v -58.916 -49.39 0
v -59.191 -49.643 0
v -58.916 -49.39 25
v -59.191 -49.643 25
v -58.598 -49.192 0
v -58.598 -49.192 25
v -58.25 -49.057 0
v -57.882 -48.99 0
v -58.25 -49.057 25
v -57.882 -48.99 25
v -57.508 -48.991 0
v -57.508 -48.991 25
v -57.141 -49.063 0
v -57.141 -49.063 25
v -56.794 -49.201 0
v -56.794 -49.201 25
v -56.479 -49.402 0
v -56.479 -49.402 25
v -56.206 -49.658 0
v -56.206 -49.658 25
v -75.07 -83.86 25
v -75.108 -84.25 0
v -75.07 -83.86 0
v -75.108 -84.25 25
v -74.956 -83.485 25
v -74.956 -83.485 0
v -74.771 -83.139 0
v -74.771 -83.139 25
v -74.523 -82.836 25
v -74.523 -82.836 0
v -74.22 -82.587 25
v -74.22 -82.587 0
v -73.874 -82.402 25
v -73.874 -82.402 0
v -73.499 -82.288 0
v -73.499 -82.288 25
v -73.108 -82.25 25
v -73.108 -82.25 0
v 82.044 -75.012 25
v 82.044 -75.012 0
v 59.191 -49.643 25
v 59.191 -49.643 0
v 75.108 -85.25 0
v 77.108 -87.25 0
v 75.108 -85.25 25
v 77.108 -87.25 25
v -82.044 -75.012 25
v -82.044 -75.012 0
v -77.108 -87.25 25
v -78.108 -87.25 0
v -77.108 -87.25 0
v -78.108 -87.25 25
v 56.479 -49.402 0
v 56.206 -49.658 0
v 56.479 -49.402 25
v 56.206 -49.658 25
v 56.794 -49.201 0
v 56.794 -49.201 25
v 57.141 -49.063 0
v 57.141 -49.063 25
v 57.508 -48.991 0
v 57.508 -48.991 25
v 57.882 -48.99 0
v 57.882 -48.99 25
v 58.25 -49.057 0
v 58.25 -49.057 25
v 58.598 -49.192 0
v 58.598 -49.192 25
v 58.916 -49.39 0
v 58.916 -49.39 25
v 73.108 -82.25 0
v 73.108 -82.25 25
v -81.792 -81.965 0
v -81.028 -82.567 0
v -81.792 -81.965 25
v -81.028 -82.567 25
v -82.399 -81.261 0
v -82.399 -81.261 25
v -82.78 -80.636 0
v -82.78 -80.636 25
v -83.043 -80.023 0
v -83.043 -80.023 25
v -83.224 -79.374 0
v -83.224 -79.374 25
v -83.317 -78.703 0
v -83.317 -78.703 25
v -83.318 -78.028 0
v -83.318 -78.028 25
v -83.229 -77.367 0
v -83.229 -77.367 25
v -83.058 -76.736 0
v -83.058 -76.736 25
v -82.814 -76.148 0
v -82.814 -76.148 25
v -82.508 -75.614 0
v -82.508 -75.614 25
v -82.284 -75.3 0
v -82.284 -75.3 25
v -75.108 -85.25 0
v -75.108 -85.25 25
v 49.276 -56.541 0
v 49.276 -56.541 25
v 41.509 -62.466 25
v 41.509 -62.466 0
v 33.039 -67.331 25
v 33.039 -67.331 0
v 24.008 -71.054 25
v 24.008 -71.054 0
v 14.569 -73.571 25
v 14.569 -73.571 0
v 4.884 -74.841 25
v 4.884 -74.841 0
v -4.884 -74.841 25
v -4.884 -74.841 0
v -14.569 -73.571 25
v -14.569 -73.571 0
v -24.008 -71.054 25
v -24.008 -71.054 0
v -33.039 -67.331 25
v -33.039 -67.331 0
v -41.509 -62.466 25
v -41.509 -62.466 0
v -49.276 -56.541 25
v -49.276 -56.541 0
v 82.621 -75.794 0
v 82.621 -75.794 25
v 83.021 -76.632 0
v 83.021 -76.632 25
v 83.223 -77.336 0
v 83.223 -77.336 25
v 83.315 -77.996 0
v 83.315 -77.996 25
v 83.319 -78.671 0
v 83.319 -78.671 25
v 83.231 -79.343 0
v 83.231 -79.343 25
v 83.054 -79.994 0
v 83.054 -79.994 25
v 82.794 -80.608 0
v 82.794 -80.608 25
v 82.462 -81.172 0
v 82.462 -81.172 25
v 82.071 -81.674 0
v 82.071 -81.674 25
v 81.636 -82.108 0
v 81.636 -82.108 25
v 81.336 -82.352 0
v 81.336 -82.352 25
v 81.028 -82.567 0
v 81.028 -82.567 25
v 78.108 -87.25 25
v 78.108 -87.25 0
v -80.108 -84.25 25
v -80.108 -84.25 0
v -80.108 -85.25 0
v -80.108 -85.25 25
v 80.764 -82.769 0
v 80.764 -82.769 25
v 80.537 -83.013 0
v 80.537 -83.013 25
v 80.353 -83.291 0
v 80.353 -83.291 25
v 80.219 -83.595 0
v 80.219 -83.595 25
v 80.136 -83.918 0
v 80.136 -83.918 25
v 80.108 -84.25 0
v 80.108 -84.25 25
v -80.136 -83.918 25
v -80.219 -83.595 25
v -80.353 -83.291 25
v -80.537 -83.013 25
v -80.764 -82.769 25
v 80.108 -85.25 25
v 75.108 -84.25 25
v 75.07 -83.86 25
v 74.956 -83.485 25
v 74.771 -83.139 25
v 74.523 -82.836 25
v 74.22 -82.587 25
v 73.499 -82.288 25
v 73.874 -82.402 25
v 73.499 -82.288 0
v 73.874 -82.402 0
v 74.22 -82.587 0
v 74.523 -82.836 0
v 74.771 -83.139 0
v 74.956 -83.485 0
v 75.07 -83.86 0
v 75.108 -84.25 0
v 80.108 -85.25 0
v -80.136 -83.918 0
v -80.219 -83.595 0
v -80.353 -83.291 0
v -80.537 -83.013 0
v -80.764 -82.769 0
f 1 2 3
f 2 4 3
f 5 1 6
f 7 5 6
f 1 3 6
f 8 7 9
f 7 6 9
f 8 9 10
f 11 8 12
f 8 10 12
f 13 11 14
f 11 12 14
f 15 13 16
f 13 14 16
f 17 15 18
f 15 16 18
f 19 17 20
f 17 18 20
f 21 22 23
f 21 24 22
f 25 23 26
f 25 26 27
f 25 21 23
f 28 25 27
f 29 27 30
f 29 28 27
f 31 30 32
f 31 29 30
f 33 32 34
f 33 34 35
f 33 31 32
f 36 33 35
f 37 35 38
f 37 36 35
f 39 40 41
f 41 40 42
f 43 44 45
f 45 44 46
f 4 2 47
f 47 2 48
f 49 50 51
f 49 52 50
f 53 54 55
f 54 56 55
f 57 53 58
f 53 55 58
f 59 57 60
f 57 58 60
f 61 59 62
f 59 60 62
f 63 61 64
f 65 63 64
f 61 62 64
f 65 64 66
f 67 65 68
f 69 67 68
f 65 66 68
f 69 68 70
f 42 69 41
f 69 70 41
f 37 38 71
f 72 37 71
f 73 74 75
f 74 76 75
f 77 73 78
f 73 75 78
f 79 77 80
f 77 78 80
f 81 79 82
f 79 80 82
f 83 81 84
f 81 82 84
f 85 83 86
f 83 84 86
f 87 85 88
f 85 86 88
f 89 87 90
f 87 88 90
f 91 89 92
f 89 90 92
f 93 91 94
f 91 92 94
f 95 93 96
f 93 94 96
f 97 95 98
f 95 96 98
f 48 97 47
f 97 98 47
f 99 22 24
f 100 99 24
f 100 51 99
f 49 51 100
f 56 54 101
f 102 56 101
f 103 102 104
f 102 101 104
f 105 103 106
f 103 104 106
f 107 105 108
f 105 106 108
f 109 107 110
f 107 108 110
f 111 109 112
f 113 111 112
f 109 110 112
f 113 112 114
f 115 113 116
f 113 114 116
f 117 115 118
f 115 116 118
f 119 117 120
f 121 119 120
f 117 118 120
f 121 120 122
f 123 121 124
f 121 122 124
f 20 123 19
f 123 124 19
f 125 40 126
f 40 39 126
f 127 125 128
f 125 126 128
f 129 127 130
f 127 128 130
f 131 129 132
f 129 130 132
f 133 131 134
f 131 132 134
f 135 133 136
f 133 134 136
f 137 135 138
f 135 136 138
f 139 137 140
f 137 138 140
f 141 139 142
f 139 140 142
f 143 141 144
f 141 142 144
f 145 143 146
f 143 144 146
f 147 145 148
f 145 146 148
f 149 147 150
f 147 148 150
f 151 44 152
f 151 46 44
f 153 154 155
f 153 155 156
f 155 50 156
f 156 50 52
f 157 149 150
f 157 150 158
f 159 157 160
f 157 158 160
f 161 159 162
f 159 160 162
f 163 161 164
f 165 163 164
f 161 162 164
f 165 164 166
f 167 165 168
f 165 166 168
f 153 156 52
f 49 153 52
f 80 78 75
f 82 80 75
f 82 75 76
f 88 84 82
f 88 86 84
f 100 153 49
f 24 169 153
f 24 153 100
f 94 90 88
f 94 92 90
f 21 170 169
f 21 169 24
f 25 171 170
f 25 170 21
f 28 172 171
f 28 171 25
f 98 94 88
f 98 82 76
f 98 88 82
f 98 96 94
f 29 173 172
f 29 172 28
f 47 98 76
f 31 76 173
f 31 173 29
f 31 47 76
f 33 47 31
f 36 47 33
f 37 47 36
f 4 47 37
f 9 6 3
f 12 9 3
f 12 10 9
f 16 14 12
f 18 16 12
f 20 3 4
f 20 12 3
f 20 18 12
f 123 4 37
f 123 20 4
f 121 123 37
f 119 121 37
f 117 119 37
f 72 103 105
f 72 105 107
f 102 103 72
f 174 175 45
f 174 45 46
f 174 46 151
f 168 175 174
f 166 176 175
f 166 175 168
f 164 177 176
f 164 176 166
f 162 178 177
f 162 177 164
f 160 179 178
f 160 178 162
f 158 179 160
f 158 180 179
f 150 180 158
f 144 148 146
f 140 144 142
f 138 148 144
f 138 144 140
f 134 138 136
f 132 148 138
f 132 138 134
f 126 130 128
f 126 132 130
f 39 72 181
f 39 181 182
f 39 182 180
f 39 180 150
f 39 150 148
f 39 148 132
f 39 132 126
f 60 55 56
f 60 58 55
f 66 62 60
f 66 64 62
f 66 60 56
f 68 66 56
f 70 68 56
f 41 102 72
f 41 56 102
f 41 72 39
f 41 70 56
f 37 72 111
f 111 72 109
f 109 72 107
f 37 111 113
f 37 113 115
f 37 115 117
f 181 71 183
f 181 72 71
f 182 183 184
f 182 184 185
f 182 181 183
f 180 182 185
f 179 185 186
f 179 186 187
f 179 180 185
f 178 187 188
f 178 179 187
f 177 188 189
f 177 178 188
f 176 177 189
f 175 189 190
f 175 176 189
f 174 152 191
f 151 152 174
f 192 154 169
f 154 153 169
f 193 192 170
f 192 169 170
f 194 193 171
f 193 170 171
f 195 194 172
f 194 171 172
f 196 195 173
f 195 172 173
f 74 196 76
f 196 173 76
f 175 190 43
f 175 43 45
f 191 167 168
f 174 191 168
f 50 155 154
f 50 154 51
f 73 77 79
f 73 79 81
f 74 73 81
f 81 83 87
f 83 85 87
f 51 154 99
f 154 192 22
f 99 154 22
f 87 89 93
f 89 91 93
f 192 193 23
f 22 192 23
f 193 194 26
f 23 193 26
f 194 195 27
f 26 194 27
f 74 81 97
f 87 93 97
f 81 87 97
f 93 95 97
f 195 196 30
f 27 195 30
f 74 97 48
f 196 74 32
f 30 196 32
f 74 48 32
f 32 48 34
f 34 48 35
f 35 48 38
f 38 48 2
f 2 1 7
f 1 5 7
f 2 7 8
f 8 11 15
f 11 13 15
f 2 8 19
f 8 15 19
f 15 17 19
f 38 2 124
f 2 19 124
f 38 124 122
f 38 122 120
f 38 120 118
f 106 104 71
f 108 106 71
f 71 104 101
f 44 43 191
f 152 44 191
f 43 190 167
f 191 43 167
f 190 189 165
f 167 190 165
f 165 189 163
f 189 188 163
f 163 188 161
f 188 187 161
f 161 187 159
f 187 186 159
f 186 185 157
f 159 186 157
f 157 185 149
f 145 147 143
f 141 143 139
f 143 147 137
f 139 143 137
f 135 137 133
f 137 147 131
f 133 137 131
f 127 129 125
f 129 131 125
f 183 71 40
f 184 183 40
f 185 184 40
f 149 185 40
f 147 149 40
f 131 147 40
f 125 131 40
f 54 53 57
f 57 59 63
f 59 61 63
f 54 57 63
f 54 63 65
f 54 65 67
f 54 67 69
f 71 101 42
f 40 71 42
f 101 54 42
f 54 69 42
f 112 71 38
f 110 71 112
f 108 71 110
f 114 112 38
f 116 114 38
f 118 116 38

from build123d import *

# Parameters (mm, degrees)
F1_DEPTH = 25
F2_W     = 5
F2_H     = 25
F3_DEPTH = 5
F4_SIZE  = 2
F5_R     = 2
F6_R     = 5


with BuildPart() as f1:
    # F0 (on Top) → F1 (new body)
    with BuildSketch(Plane.XY):
        with BuildLine():
            ThreePointArc((57.667806, -47.952312), (0, -75), (-57.667806, -47.952312))
            Line((-57.667806, -47.952312), (-88.564008, -82.249977))
            Line((-88.564008, -82.249977), (0, -82.249977))
            Line((0, -82.249977), (88.564008, -82.249977))
            Line((88.564008, -82.249977), (57.667806, -47.952312))
        make_face()
    extrude(amount=F1_DEPTH)

    # F2 (on face) → F3 (join)
    with BuildSketch(Plane.XZ.offset(82.249977)):
        with Locations((77.608379, 12.5)):
            Rectangle(F2_W, F2_H)
        with Locations((-77.608379, 12.5)):
            Rectangle(F2_W, F2_H)
    extrude(amount=F3_DEPTH)

    # F4
    f4_edges = [f1.edges().sort_by_distance(p)[0] for p in [
        (-80.108379, -87.249977, 12.5),
        (-75.108379, -87.249977, 12.5),
        (75.108379, -87.249977, 12.5),
        (80.108379, -87.249977, 12.5),
    ]]
    chamfer(f4_edges, length=F4_SIZE)

    # F5
    f5_edges = [f1.edges().sort_by_distance(p)[0] for p in [
        (-80.108379, -82.249977, 12.5),
        (-75.108379, -82.249977, 12.5),
        (80.108379, -82.249977, 12.5),
        (75.108379, -82.249977, 12.5),
        (57.667806, -47.952312, 12.5),
        (-57.667806, -47.952312, 12.5),
    ]]
    fillet(f5_edges, radius=F5_R)

    # F6
    f6_edges = [f1.edges().sort_by_distance(p)[0] for p in [
        (-88.564008, -82.249977, 12.5),
        (88.564008, -82.249977, 12.5),
    ]]
    fillet(f6_edges, radius=F6_R)


solid = f1.part
